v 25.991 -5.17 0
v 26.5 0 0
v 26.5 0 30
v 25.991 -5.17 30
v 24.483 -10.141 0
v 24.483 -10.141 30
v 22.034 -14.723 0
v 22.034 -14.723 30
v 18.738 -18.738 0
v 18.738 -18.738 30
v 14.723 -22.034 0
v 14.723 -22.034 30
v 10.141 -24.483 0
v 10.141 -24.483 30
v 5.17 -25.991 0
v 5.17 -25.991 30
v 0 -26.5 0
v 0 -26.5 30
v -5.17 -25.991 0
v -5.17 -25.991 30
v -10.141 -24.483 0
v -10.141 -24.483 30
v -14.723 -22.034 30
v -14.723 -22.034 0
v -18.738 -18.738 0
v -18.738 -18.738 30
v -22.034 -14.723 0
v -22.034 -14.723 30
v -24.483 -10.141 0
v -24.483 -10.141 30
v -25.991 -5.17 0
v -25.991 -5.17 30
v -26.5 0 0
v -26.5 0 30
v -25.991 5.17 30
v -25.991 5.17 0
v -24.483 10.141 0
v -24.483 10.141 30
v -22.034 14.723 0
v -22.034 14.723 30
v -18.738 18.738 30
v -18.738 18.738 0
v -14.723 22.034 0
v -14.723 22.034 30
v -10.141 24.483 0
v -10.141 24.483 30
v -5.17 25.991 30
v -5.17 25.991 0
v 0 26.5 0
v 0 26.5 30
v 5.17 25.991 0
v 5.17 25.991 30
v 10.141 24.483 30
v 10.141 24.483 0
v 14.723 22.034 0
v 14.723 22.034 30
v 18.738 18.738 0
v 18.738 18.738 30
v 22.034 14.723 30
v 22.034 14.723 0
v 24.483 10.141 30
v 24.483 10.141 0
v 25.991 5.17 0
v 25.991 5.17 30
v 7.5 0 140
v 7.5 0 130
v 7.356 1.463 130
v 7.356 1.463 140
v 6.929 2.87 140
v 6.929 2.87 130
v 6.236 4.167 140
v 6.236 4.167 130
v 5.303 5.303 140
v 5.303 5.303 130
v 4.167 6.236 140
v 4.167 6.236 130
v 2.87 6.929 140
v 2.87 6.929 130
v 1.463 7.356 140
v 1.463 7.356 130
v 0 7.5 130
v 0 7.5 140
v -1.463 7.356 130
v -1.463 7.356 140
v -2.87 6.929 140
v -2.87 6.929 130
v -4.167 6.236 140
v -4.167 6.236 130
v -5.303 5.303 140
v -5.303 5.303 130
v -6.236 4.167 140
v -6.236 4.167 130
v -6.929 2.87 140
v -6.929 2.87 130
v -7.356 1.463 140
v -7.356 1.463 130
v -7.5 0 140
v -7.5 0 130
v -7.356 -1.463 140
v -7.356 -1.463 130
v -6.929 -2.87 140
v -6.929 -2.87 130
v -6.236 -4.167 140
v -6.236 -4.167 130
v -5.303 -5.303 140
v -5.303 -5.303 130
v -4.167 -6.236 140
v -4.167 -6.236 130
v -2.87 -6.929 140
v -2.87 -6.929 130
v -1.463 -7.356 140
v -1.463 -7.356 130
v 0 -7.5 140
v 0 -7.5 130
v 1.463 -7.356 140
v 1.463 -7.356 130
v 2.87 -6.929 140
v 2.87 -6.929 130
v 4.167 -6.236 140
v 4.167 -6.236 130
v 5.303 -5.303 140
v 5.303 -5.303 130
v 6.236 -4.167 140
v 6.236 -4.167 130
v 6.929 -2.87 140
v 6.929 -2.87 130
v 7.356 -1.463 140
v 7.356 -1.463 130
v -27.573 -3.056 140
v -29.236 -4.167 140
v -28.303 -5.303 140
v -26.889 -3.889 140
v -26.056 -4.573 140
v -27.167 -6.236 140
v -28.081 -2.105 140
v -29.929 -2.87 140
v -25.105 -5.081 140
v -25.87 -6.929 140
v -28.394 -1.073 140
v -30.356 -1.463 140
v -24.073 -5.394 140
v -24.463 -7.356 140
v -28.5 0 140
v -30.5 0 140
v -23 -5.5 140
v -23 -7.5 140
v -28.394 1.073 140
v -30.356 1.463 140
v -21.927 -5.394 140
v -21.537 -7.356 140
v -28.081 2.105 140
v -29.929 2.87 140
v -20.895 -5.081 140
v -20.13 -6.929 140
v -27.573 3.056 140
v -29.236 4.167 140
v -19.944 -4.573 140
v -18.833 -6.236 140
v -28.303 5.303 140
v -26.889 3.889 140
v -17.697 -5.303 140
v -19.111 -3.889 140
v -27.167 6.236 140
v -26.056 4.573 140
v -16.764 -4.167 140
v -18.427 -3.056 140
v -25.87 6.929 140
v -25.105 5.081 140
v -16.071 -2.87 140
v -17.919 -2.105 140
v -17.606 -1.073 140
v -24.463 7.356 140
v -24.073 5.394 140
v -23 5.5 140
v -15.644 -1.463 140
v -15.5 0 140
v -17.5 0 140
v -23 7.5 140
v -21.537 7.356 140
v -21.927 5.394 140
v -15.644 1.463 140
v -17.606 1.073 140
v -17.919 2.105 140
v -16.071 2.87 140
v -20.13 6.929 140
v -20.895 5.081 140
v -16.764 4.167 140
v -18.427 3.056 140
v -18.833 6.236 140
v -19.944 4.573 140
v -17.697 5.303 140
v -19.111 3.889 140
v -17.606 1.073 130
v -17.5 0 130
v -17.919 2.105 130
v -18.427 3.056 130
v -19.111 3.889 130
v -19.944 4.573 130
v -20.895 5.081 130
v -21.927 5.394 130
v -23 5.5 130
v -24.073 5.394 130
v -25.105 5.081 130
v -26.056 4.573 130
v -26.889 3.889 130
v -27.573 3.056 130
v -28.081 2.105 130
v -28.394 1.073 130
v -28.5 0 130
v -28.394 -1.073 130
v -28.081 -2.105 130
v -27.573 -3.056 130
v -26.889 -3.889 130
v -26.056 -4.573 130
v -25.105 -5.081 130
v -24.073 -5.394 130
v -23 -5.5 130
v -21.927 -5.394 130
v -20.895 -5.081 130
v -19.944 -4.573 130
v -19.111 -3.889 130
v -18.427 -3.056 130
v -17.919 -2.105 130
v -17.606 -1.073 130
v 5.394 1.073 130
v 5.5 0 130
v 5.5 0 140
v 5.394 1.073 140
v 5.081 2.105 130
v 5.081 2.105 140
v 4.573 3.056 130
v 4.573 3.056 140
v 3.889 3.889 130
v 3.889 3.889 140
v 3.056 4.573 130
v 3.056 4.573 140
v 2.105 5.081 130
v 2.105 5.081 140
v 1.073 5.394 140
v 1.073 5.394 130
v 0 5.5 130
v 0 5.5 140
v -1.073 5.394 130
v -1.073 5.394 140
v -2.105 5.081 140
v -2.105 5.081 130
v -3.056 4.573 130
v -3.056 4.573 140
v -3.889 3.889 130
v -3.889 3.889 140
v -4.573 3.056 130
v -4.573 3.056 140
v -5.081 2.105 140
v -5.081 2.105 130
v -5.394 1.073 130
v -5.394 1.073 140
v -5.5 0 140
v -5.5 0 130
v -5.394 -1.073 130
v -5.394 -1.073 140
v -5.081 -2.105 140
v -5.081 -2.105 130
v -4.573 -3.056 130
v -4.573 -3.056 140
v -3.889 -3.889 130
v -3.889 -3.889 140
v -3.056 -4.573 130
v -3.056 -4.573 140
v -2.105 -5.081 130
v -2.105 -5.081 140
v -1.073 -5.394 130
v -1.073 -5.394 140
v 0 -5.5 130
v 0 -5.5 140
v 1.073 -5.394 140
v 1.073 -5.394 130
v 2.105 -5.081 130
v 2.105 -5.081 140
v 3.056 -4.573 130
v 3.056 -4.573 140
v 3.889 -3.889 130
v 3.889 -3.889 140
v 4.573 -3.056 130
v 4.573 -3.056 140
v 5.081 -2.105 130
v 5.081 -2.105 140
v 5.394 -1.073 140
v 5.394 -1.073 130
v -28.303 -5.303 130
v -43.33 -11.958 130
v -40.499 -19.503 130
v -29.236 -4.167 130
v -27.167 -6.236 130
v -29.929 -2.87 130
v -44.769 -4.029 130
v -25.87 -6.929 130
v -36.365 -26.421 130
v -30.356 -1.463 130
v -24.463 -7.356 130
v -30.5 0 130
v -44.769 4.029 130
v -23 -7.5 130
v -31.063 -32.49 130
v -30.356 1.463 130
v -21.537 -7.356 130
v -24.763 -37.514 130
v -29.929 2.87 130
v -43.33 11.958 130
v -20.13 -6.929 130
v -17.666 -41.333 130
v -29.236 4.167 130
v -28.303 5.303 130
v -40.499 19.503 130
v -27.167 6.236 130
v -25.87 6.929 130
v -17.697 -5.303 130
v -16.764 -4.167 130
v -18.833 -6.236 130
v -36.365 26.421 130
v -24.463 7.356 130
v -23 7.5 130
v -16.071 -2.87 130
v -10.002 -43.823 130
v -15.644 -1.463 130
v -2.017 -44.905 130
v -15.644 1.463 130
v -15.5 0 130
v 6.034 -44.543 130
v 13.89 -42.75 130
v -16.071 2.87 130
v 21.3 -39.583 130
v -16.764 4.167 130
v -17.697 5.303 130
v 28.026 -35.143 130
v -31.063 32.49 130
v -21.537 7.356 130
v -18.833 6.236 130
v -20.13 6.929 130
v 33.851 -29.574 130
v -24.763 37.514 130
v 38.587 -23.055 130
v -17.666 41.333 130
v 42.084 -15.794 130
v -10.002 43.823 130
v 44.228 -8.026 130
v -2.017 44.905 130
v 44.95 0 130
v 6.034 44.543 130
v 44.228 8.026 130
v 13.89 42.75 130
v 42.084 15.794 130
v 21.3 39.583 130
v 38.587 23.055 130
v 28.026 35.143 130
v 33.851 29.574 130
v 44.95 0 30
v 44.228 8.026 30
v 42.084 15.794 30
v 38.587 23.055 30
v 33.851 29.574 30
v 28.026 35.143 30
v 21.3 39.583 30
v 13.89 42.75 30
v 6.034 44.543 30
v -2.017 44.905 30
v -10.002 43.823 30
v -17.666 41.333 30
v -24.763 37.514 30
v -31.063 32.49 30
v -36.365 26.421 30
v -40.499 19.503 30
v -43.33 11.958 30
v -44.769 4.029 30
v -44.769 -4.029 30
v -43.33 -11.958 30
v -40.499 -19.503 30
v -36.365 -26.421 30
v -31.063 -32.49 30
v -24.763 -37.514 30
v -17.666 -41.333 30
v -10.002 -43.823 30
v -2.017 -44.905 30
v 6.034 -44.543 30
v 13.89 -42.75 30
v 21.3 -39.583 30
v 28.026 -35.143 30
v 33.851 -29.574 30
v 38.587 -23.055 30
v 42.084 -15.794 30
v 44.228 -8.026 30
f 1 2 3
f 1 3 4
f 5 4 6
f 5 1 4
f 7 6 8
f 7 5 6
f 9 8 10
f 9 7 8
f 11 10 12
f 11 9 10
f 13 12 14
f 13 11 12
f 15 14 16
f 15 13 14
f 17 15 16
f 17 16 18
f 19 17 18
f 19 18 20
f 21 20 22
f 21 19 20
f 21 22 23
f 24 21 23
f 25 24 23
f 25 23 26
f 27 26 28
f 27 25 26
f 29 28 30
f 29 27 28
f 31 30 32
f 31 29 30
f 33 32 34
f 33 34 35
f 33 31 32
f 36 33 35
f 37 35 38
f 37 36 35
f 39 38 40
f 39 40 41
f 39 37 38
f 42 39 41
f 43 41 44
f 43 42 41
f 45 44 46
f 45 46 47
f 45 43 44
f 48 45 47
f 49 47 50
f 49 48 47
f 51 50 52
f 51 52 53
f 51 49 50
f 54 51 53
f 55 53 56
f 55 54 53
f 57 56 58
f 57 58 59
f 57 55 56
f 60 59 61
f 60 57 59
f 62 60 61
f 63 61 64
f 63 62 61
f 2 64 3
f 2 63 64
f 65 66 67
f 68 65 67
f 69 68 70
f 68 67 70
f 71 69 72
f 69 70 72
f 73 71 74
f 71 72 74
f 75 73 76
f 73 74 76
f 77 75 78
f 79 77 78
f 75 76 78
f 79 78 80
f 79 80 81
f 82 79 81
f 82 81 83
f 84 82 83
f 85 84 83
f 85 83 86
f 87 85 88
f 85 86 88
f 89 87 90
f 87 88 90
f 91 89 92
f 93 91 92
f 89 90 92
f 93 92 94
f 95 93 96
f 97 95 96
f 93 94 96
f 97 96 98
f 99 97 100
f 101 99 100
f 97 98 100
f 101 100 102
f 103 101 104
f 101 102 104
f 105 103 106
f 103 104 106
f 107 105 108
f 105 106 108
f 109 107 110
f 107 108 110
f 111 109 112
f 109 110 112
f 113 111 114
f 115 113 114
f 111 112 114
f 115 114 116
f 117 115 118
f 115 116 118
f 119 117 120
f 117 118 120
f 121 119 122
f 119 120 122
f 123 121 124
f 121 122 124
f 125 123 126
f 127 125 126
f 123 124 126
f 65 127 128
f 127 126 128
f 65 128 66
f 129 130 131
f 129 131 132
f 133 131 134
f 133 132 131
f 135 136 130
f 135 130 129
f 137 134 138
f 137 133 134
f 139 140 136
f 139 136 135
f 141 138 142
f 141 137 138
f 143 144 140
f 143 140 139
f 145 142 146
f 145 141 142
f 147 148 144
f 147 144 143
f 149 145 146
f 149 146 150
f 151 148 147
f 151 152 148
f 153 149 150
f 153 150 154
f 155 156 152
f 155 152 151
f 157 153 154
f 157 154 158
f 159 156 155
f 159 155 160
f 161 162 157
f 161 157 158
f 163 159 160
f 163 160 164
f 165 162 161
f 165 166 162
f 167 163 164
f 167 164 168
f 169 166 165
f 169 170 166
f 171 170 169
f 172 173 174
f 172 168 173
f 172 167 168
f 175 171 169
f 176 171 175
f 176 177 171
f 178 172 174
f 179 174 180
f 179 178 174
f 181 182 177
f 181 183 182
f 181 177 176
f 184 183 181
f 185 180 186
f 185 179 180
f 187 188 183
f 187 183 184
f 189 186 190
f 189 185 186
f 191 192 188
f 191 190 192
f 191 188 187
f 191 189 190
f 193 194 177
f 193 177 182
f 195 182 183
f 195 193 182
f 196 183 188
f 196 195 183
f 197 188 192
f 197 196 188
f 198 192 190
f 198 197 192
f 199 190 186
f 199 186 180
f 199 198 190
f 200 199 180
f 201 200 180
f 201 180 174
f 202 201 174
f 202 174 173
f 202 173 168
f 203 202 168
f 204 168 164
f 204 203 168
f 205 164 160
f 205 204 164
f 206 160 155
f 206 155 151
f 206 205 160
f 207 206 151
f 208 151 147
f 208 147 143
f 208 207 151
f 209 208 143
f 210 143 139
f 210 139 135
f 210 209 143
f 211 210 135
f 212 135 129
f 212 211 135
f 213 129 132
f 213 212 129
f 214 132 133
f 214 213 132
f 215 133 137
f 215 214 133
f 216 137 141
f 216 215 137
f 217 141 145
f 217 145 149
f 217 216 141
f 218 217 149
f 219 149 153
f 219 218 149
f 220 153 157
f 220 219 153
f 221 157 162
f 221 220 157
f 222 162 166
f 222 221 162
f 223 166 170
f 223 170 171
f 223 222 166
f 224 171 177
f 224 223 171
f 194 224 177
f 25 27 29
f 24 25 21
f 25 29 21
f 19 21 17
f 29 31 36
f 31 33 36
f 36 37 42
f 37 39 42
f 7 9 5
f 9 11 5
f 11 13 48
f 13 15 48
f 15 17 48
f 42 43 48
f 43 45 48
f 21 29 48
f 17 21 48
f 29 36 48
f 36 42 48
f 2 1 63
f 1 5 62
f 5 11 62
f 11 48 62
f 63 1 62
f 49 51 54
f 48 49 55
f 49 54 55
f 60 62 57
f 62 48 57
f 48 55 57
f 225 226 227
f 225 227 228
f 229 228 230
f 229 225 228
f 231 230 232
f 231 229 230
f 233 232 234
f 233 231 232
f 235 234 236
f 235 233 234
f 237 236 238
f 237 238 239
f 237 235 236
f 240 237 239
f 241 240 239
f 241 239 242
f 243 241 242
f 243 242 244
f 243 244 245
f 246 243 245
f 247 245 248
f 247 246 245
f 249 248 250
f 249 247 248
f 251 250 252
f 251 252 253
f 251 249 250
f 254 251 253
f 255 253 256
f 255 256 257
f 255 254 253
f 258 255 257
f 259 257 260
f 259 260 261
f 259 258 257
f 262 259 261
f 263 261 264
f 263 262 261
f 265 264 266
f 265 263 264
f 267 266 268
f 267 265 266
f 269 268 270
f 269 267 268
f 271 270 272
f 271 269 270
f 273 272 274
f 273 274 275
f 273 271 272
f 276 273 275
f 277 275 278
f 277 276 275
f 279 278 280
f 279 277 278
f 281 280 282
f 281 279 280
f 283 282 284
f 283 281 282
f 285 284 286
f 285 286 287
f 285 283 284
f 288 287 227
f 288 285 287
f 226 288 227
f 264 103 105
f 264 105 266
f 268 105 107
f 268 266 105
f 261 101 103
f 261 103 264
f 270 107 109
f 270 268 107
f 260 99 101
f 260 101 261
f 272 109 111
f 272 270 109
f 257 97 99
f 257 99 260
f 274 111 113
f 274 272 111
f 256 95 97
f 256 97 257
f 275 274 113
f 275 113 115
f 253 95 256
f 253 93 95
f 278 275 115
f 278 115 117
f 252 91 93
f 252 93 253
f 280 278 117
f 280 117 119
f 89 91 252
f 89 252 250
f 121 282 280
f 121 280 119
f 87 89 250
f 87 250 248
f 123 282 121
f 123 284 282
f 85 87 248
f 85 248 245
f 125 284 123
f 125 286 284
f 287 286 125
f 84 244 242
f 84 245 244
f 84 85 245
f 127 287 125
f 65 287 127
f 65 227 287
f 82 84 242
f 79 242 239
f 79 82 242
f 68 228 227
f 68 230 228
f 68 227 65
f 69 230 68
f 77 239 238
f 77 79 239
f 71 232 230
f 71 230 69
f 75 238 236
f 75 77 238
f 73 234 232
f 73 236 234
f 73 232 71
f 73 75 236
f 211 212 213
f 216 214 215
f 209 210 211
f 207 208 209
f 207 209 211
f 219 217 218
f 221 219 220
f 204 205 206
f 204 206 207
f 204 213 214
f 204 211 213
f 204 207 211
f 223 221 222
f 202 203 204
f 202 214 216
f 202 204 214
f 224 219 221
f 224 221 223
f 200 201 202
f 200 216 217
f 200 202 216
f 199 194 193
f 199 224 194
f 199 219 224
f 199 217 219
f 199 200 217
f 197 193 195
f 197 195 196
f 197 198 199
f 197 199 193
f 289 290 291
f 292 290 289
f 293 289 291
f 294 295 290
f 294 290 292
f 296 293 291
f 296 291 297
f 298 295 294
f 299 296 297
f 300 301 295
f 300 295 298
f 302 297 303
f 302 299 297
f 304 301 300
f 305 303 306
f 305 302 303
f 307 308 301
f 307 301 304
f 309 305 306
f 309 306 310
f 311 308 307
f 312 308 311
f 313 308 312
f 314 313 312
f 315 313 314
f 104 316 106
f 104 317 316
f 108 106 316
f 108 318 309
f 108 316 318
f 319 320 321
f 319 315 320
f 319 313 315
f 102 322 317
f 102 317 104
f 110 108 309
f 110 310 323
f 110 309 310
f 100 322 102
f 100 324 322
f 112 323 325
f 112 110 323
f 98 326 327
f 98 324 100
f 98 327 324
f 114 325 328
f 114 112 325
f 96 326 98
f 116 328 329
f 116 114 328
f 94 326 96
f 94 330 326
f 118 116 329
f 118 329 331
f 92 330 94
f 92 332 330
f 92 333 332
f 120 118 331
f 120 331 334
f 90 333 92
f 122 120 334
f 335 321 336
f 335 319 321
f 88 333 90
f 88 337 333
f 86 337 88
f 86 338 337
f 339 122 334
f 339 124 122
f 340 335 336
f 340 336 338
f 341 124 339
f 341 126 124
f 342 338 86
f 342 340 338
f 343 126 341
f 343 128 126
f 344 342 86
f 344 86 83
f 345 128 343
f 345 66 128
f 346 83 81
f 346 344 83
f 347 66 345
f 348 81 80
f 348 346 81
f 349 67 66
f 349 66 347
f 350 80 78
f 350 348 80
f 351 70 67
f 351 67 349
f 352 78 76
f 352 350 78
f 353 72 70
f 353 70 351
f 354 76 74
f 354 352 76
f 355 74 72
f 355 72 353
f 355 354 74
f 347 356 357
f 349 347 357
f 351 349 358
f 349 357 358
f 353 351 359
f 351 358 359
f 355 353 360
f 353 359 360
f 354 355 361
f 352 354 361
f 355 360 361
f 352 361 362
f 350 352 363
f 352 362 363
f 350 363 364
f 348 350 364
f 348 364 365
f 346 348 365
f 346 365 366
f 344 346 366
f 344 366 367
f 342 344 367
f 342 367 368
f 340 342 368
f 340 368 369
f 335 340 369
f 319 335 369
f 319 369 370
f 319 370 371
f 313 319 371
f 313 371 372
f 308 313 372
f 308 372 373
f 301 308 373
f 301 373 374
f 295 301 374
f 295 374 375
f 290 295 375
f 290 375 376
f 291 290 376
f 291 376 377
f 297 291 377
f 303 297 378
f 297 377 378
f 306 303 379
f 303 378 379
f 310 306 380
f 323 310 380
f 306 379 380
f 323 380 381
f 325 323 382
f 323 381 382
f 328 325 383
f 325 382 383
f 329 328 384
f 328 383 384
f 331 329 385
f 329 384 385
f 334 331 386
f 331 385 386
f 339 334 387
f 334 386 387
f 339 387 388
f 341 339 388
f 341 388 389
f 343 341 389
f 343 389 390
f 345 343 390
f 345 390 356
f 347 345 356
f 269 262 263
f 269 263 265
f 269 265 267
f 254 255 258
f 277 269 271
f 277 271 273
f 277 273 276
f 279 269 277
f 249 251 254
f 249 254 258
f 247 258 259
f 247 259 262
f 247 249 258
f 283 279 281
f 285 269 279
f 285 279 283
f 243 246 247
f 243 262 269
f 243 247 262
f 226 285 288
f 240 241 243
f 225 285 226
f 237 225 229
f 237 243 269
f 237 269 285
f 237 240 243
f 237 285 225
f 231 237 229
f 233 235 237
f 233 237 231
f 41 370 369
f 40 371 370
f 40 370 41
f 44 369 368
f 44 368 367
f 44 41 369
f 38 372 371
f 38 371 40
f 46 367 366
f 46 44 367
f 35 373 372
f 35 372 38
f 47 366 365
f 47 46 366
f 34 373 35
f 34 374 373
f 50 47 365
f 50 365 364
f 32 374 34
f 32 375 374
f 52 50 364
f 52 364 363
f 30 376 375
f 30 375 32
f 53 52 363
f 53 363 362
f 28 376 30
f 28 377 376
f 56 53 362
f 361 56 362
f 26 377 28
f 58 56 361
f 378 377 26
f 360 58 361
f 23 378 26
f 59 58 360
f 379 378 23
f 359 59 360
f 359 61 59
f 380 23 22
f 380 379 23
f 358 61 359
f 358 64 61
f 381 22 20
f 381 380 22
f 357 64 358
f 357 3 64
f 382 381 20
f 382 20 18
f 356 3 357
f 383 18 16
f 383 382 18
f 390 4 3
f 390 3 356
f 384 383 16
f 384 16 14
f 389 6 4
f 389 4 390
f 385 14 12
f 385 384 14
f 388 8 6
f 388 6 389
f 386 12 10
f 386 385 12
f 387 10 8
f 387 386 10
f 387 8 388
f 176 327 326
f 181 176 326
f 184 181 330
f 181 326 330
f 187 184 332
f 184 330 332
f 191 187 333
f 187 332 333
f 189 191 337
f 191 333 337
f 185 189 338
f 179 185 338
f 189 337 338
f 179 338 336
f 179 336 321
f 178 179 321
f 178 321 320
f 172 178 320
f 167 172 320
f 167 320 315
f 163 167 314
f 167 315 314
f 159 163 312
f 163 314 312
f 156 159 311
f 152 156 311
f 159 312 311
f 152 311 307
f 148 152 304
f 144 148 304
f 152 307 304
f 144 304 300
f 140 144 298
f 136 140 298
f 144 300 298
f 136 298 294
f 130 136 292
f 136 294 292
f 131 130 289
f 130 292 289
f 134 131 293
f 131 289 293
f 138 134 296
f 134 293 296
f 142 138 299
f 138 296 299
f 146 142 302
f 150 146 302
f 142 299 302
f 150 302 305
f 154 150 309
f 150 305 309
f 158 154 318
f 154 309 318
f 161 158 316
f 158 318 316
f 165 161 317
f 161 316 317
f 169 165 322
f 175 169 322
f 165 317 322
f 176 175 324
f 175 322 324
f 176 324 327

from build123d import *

# Parameters (mm, degrees)
F0_R     = 44.95
F1_DEPTH = 130
F2_R     = 7.5
F2_R_2   = 5.5
F3_DEPTH = 10
F4_R     = 44.95
F4_R_2   = 26.5
F5_DEPTH = 30


with BuildPart() as f1:
    # F0 (on Top) → F1 (new body)
    with BuildSketch(Plane.XY):
        Circle(F0_R)
    extrude(amount=F1_DEPTH)

    # F2 (on face) → F3 (join)
    with BuildSketch(Plane.XY.offset(130)):
        Circle(F2_R)
        Circle(F2_R_2, mode=Mode.SUBTRACT)
        with Locations((-23, 0)):
            Circle(F2_R)
        with Locations((-23, 0)):
            Circle(F2_R_2, mode=Mode.SUBTRACT)
    extrude(amount=F3_DEPTH)

    # F4 (on face) → F5 (cut)
    with BuildSketch(Plane(origin=(0, 0, 0), x_dir=(1, 0, 0), z_dir=(0, 0, -1))):
        Circle(F4_R)
        Circle(F4_R_2, mode=Mode.SUBTRACT)
    extrude(amount=-F5_DEPTH, mode=Mode.SUBTRACT)


solid = f1.part
